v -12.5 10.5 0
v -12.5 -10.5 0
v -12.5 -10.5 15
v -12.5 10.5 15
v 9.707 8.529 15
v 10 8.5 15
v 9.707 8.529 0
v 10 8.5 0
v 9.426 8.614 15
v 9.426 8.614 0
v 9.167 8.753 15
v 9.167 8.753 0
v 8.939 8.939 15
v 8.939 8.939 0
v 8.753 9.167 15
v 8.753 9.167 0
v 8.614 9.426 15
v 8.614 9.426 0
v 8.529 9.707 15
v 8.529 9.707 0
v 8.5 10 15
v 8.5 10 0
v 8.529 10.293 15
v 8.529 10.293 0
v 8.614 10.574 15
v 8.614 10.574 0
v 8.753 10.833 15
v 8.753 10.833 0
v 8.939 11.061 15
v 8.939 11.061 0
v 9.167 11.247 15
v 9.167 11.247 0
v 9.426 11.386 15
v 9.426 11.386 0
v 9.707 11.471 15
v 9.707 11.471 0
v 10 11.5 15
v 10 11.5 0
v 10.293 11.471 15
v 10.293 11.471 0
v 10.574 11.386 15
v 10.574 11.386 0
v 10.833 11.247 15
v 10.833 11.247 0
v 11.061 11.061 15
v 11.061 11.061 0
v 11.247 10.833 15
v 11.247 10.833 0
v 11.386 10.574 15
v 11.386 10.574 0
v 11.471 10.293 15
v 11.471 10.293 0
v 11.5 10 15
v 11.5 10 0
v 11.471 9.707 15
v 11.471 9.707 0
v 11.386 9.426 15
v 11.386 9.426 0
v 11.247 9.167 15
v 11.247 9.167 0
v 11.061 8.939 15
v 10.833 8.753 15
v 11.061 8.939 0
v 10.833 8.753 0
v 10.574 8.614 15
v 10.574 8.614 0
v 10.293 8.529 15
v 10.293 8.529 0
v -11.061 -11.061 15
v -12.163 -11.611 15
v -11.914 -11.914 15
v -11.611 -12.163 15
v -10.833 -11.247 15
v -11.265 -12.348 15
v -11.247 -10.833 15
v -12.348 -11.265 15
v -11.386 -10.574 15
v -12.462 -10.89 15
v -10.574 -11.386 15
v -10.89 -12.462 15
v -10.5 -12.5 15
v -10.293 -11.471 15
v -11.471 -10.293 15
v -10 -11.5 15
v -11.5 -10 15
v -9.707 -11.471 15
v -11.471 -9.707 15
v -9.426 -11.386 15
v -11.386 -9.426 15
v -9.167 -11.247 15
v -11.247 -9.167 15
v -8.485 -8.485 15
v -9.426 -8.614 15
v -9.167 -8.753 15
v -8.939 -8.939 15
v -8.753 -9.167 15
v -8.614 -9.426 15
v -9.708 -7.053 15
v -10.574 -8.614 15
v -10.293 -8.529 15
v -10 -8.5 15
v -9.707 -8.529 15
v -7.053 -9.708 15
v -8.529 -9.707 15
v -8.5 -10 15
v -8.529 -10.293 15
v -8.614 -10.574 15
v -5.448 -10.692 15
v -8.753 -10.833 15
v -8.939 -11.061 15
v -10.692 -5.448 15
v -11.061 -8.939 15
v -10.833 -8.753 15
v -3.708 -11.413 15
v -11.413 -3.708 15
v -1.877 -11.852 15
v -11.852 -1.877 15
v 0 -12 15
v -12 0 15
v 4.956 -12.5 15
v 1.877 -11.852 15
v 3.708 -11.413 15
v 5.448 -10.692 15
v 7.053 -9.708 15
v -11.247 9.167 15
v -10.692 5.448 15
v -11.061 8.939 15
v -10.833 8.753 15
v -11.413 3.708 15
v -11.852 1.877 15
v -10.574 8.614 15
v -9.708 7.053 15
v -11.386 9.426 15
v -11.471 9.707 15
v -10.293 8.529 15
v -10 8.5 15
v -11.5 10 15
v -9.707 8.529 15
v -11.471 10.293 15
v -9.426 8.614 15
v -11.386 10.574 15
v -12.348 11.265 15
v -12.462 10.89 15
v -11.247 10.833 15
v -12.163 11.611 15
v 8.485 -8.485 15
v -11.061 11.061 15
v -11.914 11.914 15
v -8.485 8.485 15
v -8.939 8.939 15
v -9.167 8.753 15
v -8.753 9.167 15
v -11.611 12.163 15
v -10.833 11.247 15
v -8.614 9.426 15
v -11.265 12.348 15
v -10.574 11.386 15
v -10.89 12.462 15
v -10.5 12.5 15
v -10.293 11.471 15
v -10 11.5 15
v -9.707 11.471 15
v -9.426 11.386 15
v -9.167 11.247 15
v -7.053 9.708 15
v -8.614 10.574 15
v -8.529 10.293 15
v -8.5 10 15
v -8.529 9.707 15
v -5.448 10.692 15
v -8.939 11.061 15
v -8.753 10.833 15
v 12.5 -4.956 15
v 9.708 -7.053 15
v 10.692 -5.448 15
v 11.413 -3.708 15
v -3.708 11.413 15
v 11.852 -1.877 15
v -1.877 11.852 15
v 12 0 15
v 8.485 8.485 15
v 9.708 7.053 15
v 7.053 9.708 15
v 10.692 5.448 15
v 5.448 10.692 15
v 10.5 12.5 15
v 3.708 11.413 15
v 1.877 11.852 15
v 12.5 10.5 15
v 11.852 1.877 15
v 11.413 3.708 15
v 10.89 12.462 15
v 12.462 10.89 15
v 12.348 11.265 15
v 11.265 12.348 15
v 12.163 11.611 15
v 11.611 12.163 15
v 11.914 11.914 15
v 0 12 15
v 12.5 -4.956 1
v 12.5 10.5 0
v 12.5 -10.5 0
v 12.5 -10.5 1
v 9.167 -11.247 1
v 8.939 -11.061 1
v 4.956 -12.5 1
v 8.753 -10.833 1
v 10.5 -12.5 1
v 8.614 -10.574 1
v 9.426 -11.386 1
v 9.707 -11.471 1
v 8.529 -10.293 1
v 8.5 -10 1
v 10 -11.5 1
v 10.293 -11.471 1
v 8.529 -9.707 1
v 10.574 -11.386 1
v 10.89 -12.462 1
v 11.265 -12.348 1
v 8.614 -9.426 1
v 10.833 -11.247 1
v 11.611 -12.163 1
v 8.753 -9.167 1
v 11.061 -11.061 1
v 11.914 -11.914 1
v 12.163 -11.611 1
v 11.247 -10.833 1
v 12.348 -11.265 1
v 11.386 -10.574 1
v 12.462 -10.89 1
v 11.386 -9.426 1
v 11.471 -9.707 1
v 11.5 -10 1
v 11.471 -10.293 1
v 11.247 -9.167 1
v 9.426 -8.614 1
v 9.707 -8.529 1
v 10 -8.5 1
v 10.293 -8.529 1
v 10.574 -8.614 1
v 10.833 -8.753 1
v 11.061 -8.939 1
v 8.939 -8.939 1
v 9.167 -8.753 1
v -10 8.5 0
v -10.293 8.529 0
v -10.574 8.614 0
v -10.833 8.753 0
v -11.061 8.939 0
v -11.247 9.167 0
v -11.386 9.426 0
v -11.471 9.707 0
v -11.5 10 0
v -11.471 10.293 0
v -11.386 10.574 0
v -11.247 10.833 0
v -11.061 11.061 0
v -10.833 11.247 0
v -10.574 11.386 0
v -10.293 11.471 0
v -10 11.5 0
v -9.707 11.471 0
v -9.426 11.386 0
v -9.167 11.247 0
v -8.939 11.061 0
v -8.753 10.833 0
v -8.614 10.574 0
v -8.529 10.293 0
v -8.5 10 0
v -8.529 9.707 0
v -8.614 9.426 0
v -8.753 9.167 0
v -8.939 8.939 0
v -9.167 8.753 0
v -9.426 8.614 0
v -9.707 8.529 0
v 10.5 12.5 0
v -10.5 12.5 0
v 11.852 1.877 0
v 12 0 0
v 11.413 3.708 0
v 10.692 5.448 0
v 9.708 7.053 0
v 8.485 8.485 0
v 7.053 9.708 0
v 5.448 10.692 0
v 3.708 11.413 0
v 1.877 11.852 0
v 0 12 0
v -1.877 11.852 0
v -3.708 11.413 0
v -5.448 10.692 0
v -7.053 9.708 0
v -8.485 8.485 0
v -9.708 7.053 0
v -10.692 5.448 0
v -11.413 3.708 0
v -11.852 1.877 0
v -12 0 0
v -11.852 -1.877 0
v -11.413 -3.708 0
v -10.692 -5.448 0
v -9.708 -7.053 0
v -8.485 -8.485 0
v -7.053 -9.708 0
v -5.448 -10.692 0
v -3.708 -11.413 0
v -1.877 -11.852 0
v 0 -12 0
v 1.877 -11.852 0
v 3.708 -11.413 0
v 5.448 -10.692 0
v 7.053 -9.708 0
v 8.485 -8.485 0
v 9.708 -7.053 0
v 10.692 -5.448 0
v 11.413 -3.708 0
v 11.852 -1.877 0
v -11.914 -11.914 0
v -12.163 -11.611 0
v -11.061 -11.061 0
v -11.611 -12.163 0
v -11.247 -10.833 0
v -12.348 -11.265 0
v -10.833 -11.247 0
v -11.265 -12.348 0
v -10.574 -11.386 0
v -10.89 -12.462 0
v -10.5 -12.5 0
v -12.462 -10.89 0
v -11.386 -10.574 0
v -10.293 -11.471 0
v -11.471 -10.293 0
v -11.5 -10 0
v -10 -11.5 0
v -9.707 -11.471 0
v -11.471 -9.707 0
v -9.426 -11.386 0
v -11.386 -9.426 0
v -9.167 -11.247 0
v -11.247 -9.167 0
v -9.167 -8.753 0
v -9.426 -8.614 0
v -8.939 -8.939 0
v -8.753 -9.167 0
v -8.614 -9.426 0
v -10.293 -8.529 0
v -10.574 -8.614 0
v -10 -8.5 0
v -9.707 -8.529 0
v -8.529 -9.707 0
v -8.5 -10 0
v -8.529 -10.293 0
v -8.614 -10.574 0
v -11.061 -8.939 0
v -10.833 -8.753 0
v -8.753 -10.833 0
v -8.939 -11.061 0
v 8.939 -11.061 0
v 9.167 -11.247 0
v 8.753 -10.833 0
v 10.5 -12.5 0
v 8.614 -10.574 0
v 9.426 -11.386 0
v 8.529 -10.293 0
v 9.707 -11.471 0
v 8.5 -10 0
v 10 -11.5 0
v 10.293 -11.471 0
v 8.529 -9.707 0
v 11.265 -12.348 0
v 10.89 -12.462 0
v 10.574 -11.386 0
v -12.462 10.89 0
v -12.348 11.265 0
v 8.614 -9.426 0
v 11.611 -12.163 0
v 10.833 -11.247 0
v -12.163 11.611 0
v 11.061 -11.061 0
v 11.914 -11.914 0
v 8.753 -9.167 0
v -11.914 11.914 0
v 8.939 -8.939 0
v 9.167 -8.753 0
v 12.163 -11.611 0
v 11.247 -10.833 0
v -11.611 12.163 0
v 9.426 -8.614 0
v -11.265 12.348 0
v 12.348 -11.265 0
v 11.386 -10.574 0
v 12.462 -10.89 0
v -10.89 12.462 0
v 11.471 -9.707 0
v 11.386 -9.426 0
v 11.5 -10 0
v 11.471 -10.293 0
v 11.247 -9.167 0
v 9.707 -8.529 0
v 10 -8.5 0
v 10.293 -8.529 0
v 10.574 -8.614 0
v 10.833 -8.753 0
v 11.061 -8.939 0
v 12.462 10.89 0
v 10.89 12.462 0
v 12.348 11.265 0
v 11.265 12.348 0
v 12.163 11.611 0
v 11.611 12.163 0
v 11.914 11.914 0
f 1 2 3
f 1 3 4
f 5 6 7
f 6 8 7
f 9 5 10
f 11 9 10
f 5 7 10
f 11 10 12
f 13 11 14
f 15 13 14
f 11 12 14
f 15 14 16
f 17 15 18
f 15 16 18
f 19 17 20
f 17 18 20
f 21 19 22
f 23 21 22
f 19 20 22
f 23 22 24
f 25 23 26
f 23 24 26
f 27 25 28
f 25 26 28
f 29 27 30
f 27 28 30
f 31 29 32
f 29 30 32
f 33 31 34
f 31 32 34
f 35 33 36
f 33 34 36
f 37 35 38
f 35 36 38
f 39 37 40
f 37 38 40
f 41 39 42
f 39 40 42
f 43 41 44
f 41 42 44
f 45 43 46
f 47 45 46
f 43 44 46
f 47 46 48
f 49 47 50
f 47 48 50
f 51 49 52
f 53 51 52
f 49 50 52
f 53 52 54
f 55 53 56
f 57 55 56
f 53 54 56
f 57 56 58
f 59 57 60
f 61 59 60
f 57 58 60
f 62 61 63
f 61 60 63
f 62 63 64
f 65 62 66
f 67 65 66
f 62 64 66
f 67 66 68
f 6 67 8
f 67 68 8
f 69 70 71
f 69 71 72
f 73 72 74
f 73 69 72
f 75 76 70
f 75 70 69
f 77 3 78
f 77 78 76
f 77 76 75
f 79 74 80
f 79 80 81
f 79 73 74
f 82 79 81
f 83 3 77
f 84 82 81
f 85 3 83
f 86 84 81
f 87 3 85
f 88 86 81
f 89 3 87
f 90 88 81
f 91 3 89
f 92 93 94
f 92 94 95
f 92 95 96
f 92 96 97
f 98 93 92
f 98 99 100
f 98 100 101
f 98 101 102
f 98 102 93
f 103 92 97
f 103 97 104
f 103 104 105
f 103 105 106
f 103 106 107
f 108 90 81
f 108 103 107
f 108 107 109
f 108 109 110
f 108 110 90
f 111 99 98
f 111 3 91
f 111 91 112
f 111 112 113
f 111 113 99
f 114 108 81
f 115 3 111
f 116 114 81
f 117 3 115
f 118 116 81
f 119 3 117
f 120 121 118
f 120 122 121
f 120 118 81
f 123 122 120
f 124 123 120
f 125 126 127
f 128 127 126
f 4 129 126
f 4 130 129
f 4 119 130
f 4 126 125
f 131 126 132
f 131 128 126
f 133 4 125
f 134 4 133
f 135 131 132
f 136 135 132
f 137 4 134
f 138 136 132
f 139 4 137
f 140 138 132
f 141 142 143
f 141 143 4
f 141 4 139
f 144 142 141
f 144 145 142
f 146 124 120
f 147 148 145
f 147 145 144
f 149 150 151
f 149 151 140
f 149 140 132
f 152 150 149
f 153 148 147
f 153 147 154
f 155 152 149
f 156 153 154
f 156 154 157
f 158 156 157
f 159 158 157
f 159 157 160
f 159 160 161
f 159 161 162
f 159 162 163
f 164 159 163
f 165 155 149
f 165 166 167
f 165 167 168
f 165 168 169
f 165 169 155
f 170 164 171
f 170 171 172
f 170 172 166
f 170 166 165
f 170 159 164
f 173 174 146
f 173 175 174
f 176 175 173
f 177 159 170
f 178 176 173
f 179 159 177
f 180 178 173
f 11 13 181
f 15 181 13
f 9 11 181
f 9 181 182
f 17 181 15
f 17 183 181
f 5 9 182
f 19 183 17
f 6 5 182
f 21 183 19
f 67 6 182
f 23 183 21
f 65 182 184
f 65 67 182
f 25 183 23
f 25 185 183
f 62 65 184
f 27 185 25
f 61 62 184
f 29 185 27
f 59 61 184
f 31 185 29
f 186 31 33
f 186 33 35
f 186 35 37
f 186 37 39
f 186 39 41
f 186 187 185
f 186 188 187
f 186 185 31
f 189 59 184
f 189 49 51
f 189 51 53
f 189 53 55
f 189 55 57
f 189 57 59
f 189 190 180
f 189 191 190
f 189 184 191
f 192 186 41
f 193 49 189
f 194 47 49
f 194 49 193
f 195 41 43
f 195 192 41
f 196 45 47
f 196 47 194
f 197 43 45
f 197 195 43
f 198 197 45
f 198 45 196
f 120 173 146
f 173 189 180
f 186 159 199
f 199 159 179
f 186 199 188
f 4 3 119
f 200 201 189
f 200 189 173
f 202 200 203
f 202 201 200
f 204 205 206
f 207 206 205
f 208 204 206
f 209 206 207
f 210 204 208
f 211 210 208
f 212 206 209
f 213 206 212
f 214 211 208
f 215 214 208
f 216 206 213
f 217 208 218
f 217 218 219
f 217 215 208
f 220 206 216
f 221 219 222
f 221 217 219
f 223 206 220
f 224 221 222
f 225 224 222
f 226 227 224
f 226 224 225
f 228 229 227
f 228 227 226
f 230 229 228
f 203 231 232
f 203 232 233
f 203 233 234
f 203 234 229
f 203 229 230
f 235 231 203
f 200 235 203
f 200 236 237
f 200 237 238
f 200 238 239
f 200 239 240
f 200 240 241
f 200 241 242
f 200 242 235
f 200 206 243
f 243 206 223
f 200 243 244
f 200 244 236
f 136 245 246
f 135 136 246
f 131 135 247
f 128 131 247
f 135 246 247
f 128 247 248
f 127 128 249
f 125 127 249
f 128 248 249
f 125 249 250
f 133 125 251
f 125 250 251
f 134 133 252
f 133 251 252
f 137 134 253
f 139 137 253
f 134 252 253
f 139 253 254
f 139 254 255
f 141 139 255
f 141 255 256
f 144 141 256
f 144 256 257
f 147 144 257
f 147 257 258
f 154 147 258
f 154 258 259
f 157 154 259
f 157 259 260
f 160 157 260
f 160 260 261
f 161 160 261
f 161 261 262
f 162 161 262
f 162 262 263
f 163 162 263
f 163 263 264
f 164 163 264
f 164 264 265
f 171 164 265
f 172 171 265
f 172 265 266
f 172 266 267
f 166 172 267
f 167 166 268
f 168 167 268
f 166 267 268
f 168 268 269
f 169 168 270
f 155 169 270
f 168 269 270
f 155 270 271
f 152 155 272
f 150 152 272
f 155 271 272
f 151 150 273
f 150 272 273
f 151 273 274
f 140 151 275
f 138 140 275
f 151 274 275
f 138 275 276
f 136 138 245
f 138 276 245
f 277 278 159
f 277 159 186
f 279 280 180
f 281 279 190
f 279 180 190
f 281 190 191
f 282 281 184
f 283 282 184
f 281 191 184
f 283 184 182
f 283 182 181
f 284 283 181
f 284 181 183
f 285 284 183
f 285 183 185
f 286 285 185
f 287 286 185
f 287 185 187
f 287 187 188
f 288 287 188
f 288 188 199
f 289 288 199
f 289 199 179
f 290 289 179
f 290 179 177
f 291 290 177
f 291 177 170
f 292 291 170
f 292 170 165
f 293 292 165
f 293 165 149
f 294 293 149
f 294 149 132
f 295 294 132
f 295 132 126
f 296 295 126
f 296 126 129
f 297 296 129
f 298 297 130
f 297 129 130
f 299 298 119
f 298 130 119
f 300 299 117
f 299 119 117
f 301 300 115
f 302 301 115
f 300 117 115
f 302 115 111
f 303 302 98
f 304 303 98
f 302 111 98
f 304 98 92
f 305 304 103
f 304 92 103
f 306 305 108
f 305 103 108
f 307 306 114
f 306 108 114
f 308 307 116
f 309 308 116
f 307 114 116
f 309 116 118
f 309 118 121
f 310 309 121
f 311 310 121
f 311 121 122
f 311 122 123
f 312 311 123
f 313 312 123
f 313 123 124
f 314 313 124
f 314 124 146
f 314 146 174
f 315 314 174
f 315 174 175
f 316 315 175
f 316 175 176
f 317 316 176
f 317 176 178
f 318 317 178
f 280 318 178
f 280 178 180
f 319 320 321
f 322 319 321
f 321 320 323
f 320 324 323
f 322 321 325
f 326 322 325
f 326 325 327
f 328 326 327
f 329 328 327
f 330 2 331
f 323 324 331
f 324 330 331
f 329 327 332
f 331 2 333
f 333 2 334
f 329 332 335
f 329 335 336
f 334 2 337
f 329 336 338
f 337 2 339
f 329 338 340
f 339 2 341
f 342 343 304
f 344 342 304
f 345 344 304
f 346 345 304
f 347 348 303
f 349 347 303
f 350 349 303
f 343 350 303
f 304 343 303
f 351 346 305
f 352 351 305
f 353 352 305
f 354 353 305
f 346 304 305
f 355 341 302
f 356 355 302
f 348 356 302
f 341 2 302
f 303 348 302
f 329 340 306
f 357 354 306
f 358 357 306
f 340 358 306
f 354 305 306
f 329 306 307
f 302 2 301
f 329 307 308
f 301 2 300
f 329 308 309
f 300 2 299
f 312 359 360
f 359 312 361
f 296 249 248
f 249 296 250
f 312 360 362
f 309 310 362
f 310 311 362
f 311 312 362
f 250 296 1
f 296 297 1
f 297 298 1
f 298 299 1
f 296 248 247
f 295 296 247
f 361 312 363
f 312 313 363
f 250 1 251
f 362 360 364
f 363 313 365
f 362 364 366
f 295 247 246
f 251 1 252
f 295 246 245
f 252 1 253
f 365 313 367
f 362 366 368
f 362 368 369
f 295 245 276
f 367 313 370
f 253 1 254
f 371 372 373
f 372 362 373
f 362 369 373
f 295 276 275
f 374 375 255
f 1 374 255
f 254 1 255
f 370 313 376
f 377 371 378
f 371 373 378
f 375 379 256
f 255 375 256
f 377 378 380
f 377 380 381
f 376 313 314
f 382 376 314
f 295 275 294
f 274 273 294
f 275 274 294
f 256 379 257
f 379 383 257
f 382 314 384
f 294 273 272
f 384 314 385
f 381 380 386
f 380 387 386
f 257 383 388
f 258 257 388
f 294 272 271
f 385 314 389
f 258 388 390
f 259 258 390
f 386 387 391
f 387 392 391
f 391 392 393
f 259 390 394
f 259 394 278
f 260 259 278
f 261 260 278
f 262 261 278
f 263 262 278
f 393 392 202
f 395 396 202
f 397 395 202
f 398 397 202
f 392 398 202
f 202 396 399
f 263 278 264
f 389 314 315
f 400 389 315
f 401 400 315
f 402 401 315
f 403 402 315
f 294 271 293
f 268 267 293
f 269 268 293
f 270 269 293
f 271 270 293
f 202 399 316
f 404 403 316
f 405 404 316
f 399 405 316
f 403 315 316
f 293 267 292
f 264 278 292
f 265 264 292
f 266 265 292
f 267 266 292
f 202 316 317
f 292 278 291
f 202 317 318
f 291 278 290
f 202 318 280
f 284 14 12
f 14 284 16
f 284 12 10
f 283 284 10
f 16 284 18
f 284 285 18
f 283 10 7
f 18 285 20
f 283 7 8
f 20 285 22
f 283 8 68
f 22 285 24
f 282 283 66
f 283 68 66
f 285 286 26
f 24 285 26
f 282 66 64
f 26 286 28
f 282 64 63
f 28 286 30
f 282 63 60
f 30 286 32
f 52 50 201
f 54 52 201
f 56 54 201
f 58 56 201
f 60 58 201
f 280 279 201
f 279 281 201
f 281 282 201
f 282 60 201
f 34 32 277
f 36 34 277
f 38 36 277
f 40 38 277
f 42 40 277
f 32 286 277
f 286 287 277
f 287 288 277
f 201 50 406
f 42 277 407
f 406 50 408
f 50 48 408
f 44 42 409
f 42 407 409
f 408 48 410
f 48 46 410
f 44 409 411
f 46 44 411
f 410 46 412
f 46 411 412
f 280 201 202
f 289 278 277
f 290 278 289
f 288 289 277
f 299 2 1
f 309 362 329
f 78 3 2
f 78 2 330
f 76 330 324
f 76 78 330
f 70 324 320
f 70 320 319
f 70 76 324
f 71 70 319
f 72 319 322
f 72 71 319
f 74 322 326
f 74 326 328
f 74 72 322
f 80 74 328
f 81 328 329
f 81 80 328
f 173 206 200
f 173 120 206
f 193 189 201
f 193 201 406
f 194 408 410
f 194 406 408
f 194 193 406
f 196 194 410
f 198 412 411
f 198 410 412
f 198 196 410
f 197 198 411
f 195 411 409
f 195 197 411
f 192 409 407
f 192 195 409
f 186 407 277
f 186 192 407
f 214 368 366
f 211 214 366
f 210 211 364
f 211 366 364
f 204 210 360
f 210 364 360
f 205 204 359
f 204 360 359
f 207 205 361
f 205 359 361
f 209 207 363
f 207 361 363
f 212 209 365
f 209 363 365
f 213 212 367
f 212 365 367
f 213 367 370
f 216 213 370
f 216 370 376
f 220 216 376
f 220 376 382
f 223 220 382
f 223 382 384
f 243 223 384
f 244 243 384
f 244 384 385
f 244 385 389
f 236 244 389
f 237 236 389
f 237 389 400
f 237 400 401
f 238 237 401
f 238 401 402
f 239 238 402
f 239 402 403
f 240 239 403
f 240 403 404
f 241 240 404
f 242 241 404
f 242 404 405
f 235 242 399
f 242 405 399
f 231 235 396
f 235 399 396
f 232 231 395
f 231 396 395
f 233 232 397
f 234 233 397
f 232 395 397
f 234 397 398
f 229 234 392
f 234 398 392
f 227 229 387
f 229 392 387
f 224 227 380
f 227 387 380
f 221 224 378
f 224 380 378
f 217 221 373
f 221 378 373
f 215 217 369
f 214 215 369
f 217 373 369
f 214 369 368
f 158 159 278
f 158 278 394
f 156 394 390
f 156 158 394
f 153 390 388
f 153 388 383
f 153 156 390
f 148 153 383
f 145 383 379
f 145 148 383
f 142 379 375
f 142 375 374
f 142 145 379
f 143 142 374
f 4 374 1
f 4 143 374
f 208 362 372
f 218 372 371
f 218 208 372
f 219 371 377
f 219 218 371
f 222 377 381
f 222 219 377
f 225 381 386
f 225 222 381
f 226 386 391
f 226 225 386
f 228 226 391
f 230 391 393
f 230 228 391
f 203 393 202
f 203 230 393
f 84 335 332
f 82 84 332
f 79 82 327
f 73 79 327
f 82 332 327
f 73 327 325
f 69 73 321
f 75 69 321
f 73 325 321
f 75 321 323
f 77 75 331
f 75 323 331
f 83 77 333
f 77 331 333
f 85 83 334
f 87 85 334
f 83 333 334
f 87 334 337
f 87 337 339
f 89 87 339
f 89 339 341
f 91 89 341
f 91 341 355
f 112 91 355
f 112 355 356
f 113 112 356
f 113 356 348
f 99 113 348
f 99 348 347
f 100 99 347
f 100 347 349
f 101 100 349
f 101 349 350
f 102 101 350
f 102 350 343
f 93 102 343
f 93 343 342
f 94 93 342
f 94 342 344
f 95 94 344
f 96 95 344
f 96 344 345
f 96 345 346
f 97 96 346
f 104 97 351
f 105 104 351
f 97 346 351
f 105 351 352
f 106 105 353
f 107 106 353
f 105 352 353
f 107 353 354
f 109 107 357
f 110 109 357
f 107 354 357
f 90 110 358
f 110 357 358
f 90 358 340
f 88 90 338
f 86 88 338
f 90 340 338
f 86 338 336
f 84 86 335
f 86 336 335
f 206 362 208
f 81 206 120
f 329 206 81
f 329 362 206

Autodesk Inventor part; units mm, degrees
ref_plane "YZ Plane" through (0, 0, 0) normal (1, 0, 0) x (0, 1, 0)
ref_plane "XZ Plane" through (0, 0, 0) normal (0, 1, 0) x (-1, 0, 0)
ref_plane "XY Plane" through (0, 0, 0) normal (0, 0, 1) x (1, 0, 0)
sketch "Sketch1" plane through (0, 0, 0) normal (0, 0, 1) x (1, 0, 0)
  line L0 (-12.5, 12.5) -> (12.5, 12.5)
  line L1 (12.5, 12.5) -> (12.5, -12.5)
  line L2 (12.5, -12.5) -> (-12.5, -12.5)
  line L3 (-12.5, -12.5) -> (-12.5, 12.5)
  line L4 (-12.5, 12.5) -> (12.5, -12.5) construction
  line L5 (12.5, 12.5) -> (-12.5, -12.5) construction
  point P0 (0, 0)
  dimension "d0" = 25
  dimension "d1" = 25
extrude "Extrusion1" add sketch "Sketch1" along normal blind 15
sketch "Sketch2" plane through (0, 0, 15) normal (0, 0, 1) x (1, 0, 0)
  line L0 (-10, -10) -> (10, -10)
  line L1 (10, -10) -> (10, 10)
  line L2 (10, 10) -> (-10, 10)
  line L3 (-10, 10) -> (-10, -10)
  line L4 (-10, -10) -> (10, 10) construction
  line L5 (10, -10) -> (-10, 10) construction
  point P0 (0, 0)
  dimension "d4" = 20
  dimension "d5" = 20
hole "Hole1" at (-10, 10, 15) at (10, 10, 15) at (10, -10, 15) at (-10, -10, 15) direction (0, 0, -1) diameter 3 end through all
fillet "Fillet1" radius 2 4 edges at (-12.5, 12.5, 7.5) (-12.5, -12.5, 7.5) (12.5, -12.5, 7.5) (12.5, 12.5, 7.5)
sketch "Sketch3" plane through (0, 0, 15) normal (0, 0, 1) x (1, 0, 0)
  circle A0 centre (0, 0) radius 12
  dimension "d14" = 24
extrude "Extrusion2" cut sketch "Sketch3" against normal through all
sketch "Sketch4" plane through (0, 0, 15) normal (0, 0, 1) x (1, 0, 0)
  line L0 (-10.5, -12.5) -> (10.5, -12.5) projected
  line L1 (4.9555, -12.5) -> (12.5, -4.9555)
  line L2 (12.5, -10.5) -> (12.5, 10.5) projected
  arc A0 (10.5, -12.5) -> (12.5, -10.5) centre (10.5, -10.5) ccw projected
  point P0 (0, 0)
  dimension "d17" = 45
extrude "Extrusion3" cut sketch "Sketch4" against normal blind 14
properties part number "MF25150V1-1000U-A99" material "ABS Plastic"
